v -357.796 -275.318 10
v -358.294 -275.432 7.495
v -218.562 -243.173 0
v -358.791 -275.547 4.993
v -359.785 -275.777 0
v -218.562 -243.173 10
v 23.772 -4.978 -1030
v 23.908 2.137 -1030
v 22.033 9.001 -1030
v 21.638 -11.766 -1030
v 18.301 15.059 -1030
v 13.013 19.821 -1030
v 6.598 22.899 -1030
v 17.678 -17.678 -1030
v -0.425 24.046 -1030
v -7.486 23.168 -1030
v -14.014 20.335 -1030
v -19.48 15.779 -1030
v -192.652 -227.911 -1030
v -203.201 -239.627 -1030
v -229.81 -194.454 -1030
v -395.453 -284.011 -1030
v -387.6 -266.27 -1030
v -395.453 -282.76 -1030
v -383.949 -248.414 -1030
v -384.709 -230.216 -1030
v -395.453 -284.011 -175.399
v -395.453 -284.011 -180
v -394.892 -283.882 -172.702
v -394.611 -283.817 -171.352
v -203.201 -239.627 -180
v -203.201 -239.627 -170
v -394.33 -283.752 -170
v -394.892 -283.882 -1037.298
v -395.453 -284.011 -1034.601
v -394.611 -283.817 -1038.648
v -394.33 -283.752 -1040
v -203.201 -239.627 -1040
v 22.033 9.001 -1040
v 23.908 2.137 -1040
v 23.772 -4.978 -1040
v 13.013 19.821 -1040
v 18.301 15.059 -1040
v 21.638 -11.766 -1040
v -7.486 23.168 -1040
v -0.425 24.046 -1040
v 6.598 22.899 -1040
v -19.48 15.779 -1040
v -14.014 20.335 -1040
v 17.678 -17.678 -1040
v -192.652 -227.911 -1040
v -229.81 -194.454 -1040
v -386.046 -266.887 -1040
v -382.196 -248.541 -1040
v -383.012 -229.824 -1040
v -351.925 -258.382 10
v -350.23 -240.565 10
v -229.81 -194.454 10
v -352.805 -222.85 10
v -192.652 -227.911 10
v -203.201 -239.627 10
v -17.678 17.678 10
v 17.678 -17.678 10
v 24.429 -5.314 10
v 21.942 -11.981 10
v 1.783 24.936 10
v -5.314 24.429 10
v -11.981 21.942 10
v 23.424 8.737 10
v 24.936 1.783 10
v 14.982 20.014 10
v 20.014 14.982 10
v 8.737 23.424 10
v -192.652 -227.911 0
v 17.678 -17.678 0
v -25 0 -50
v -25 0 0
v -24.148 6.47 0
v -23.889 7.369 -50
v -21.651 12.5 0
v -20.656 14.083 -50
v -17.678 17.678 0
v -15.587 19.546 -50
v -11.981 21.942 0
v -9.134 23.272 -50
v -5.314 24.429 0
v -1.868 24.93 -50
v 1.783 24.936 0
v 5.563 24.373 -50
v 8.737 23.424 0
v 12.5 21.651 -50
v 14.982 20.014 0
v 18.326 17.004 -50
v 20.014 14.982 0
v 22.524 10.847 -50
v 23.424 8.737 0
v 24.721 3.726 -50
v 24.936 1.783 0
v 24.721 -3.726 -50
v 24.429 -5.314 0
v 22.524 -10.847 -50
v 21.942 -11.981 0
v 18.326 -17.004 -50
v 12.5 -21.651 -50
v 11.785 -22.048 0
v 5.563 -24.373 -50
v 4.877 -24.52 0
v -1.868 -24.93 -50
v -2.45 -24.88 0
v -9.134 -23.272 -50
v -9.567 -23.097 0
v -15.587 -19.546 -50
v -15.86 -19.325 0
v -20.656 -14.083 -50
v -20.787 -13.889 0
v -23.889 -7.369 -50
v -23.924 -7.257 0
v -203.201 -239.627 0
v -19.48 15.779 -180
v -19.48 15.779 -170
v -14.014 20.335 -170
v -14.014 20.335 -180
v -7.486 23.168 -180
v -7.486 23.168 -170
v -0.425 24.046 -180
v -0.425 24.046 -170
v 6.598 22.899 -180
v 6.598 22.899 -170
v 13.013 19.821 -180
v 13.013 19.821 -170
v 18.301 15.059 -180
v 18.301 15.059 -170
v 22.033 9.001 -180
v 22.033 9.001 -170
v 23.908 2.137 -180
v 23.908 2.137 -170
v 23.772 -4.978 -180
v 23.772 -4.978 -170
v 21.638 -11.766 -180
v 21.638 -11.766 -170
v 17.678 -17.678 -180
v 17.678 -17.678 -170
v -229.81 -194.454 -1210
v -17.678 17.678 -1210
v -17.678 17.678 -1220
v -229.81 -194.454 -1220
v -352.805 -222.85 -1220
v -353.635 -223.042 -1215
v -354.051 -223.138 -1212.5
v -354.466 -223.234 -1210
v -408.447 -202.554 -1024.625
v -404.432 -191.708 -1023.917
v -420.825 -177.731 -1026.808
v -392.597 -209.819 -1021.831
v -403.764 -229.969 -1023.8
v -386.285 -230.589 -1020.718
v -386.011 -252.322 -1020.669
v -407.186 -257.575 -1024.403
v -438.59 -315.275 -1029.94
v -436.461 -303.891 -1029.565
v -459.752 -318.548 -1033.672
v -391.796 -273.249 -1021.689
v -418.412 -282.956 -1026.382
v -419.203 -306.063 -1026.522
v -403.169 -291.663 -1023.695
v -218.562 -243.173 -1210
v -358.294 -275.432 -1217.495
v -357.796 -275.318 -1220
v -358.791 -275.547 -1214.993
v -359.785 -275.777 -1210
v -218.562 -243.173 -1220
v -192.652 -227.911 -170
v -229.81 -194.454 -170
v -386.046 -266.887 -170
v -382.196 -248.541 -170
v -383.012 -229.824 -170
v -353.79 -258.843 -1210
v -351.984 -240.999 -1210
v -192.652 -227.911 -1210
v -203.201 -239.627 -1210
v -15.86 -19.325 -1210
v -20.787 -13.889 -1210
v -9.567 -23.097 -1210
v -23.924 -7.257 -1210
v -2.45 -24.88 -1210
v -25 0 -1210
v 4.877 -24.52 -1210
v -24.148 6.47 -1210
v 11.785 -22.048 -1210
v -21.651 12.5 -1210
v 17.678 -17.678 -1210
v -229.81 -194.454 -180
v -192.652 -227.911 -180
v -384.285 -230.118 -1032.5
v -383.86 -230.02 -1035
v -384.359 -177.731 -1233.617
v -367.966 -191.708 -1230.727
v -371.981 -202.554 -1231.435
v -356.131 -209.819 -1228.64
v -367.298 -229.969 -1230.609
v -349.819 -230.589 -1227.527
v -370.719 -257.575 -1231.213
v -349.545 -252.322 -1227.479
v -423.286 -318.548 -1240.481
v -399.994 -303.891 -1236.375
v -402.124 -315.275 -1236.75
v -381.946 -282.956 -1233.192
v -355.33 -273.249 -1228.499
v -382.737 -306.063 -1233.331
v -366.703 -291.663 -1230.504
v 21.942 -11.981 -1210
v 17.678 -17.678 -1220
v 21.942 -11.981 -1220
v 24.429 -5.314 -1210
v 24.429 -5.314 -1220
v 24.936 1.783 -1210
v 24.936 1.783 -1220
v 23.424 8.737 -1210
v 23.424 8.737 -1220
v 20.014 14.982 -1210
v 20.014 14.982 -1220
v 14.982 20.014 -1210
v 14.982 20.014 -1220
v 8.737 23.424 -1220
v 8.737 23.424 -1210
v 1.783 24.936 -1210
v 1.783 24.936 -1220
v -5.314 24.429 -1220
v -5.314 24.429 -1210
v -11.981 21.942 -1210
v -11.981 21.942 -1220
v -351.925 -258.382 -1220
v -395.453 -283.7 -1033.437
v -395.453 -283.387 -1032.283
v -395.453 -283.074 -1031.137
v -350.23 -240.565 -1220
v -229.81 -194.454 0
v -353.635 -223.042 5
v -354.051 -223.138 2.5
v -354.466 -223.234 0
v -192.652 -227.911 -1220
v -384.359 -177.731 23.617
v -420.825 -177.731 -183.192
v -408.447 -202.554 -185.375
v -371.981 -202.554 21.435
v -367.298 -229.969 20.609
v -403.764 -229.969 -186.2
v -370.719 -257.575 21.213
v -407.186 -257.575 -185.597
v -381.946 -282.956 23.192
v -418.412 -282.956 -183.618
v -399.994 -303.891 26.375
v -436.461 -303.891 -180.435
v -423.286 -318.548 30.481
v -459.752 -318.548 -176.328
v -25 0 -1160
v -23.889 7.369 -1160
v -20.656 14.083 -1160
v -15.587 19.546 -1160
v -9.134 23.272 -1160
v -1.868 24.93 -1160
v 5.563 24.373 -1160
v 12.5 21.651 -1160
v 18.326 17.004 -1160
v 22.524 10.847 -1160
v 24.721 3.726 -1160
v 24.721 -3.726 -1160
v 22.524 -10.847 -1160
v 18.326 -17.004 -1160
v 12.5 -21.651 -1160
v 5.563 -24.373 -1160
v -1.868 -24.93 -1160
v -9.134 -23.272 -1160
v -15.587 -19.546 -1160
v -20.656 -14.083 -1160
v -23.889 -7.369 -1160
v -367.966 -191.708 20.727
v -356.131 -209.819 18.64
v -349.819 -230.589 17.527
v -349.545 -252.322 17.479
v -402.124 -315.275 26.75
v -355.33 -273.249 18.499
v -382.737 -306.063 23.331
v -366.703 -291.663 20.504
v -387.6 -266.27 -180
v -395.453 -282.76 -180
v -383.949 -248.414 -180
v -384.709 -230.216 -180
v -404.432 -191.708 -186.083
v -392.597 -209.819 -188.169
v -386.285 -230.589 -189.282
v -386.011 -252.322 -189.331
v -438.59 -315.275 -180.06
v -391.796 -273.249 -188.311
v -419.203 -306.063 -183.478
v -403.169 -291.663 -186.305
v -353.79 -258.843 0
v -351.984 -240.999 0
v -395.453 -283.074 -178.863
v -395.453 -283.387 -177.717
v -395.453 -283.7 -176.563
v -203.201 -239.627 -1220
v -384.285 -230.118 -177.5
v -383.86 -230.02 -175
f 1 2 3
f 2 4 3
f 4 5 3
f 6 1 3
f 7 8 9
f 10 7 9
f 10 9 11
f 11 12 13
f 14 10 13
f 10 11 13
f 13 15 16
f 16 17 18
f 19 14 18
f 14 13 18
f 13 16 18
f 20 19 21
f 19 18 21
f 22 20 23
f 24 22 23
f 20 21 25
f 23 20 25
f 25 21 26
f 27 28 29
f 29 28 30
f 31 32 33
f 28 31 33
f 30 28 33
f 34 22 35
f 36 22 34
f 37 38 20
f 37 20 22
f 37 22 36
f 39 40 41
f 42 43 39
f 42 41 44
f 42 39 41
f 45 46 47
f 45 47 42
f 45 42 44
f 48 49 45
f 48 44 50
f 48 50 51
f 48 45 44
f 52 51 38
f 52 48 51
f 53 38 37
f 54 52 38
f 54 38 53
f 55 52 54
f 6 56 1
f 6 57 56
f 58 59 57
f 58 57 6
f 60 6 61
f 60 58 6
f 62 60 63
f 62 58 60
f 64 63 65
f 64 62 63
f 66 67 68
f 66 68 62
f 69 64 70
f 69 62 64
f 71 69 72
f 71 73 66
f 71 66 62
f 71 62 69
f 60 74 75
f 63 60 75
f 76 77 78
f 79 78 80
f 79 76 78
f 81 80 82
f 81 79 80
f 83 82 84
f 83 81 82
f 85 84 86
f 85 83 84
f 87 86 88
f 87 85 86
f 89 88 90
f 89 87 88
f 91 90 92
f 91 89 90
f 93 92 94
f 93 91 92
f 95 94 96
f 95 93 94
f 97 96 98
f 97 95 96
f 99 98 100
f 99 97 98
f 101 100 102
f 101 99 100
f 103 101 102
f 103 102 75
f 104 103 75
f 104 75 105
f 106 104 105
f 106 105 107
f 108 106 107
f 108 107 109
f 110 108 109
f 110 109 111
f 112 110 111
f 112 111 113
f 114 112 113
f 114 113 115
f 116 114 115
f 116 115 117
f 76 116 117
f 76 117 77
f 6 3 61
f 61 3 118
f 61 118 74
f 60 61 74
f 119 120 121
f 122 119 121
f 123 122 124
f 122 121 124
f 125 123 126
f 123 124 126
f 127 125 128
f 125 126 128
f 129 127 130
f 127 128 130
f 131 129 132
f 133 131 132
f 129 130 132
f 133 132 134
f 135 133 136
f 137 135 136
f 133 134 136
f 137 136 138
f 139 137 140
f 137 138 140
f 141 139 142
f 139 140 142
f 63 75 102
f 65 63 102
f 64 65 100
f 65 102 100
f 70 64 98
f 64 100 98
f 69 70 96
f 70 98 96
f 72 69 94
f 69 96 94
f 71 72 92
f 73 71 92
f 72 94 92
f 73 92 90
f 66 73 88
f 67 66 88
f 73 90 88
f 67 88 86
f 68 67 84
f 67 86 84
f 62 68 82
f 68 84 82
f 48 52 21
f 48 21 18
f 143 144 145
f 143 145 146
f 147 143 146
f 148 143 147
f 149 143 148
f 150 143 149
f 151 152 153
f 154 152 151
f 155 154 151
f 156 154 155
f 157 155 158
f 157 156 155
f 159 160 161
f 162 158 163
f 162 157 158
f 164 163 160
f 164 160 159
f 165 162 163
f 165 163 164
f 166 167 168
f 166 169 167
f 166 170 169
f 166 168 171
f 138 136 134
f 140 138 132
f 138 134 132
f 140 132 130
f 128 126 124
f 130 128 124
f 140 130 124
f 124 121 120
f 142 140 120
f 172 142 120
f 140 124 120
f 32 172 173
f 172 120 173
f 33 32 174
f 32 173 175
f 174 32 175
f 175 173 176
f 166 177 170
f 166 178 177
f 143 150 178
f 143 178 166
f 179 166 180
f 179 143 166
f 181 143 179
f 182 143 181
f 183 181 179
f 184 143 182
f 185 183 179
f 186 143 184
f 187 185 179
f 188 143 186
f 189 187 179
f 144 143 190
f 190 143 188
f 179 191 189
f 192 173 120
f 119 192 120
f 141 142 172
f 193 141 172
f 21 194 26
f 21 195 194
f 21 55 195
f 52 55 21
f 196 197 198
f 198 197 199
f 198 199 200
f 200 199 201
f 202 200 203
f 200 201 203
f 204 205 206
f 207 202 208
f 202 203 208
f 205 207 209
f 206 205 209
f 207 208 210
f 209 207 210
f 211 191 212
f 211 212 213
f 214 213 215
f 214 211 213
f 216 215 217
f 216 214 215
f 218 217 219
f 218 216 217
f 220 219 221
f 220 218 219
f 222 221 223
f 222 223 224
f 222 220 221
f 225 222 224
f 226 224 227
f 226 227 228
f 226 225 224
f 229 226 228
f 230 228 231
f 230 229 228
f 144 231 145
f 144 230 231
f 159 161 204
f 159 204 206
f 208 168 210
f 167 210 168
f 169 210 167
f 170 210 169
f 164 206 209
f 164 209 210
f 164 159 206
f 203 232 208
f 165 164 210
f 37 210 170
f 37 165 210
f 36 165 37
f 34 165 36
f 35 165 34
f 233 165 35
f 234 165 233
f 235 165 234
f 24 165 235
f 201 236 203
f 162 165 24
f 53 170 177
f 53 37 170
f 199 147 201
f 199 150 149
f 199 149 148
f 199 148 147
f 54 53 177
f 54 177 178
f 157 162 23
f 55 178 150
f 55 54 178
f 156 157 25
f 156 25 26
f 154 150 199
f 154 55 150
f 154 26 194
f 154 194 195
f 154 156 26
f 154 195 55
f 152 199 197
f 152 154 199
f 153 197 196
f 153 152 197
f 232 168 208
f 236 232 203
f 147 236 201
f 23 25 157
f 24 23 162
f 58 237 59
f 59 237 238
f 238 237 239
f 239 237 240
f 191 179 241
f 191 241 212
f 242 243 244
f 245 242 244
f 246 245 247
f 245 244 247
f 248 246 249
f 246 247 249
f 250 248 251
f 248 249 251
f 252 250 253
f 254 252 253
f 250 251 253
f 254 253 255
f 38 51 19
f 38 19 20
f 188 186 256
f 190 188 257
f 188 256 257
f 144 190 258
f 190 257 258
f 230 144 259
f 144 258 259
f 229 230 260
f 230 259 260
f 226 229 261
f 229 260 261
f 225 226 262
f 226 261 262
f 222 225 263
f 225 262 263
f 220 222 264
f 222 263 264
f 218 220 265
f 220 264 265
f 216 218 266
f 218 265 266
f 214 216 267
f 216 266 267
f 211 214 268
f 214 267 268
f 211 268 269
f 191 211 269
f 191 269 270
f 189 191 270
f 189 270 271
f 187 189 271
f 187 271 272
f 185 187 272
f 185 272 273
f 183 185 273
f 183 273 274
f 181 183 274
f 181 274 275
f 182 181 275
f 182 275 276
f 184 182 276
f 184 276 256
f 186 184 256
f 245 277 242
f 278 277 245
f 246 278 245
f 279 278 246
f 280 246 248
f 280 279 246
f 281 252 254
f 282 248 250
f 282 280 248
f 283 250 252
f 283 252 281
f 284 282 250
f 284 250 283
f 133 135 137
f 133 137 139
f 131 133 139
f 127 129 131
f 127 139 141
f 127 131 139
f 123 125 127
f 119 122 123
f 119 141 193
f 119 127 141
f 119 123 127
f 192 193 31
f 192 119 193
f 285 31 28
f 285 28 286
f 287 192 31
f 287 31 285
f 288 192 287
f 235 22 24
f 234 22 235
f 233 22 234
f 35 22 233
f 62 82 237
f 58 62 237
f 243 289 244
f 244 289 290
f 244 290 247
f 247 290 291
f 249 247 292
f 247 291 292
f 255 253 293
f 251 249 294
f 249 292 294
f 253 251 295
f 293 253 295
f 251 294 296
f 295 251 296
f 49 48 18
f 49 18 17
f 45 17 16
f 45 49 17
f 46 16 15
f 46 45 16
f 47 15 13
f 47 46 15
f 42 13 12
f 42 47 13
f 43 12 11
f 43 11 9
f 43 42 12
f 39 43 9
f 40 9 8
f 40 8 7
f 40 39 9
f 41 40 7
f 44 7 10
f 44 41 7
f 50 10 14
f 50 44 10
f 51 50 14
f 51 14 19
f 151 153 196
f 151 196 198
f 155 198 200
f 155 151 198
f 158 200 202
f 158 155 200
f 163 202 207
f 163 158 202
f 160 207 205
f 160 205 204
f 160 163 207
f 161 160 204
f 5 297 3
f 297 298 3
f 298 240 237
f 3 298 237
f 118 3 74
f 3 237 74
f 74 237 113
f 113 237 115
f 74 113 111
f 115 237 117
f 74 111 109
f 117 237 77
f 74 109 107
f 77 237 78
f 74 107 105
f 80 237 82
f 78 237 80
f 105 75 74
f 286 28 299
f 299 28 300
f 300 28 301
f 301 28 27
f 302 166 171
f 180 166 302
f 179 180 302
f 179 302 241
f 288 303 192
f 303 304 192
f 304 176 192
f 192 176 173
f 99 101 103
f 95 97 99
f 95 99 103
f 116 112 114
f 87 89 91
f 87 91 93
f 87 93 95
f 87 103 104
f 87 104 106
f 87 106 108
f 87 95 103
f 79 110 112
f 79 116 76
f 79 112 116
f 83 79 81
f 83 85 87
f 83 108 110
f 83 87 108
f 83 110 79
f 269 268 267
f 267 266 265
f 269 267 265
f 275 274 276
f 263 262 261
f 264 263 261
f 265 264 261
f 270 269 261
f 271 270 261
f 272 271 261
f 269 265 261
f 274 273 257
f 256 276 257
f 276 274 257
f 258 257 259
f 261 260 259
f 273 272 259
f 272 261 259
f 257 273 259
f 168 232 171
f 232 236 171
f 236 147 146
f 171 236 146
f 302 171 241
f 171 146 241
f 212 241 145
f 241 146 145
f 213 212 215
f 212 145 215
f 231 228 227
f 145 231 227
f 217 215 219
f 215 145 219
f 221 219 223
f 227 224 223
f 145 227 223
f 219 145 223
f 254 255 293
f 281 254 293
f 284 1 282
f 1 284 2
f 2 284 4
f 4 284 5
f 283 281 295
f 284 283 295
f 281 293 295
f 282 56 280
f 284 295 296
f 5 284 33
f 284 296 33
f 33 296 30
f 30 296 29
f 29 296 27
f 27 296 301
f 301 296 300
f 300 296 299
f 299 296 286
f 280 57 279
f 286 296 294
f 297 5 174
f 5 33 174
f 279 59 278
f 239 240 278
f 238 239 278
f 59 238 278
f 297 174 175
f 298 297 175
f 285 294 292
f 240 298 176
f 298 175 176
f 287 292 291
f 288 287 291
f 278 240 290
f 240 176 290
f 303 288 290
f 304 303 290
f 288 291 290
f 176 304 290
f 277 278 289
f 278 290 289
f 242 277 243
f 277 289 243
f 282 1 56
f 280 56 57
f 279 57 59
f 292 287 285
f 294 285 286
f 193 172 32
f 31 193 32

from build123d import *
from build123d.topology import SkipClean

# Parameters (mm, degrees)
BOSS_EXTRUDE1_DEPTH      = 10
BOSS_EXTRUDE2_START      = 50
SKETCH4_R                = 25
BOSS_EXTRUDE2_DEPTH      = 50
BOSS_EXTRUDE3_DEPTH      = 10
BOSS_EXTRUDE3_DEPTH_BACK = 200
BOSS_EXTRUDE4_DEPTH      = 10


with BuildPart() as part:
    # Sketch2 → Boss-Extrude1 (new body)
    with BuildSketch(Plane.XY):
        with BuildLine():
            Line((-17.67766953, 17.67766953), (-229.809703886, -194.454364826))
            Line((-229.809703886, -194.454364826), (-364.717660886, -225.600320827))
            Line((-364.717660886, -225.600320827), (-364.717660886, -276.915526217))
            Line((-364.717660886, -276.915526217), (-218.562151168, -243.172868066))
            Line((-218.562151168, -243.172868066), (-203.201266101, -239.626528316))
            Line((-203.201266101, -239.626528316), (-192.652462612, -227.910895144))
            Line((-192.652462612, -227.910895144), (17.67766953, -17.67766953))
            ThreePointArc((17.67766953, -17.67766953), (17.67766953, 17.67766953), (-17.67766953, 17.67766953))
        make_face()
    extrude(amount=BOSS_EXTRUDE1_DEPTH)

    # Sketch4 → Boss-Extrude2 (add)
    with SkipClean():  # the faces are left unmerged after this step: merging them gives an invalid solid
        with BuildSketch(Plane(origin=(0, 0, 0), x_dir=(-1, 0, 0), z_dir=(0, 0, -1)).offset(BOSS_EXTRUDE2_START)):
            Circle(SKETCH4_R)
        extrude(amount=-BOSS_EXTRUDE2_DEPTH)

    # Sketch8 → Boss-Extrude3 (add, two sides: drawn at the far end of the back side and taken through both)
    with SkipClean():  # the faces are left unmerged after this step: merging them gives an invalid solid
        with BuildSketch(Plane(origin=(-9.287482424, 0, -52.671930221), x_dir=(0, -1, 0), z_dir=(0.173648177666934, 0, 0.9848077530122075)).offset(-BOSS_EXTRUDE3_DEPTH_BACK)):
            with BuildLine():
                ThreePointArc((177.730965122, -382.620384791), (257.574654139, -368.770911493), (318.547687963, -422.14798272))
                ThreePointArc((318.547687963, -422.14798272), (262.996456529, -349.455787773), (177.730965122, -382.620384791))
            make_face()
        extrude(amount=BOSS_EXTRUDE3_DEPTH + BOSS_EXTRUDE3_DEPTH_BACK)

    # Sketch9 → Boss-Extrude4 (add)
    with SkipClean():  # the faces are left unmerged after this step: merging them gives an invalid solid
        with BuildSketch(Plane(origin=(0, 0, -170), x_dir=(-1, 0, 0), z_dir=(0, 0, -1))):
            with BuildLine():
                Line((395.452614899, -284.011249454), (395.452614899, -232.696044065))
                Line((395.452614899, -232.696044065), (229.809703886, -194.454364826))
                Line((229.809703886, -194.454364826), (19.479571744, 15.778860788))
                ThreePointArc((19.479571744, 15.778860788), (-15.827314052, 17.629216266), (-17.67766953, -17.67766953))
                Line((-17.67766953, -17.67766953), (192.652462612, -227.910895144))
                Line((192.652462612, -227.910895144), (203.201266101, -239.626528316))
                Line((203.201266101, -239.626528316), (395.452614899, -284.011249454))
            make_face()
        extrude(amount=BOSS_EXTRUDE4_DEPTH)


with BuildPart() as body_2:
    # Mirror6: mirrored copy
    add(part.part.mirror(Plane(origin=(0, 0, -605), x_dir=(1, 0, 0), z_dir=(0, 0, -1))))


solid = Compound([part.part, body_2.part])
